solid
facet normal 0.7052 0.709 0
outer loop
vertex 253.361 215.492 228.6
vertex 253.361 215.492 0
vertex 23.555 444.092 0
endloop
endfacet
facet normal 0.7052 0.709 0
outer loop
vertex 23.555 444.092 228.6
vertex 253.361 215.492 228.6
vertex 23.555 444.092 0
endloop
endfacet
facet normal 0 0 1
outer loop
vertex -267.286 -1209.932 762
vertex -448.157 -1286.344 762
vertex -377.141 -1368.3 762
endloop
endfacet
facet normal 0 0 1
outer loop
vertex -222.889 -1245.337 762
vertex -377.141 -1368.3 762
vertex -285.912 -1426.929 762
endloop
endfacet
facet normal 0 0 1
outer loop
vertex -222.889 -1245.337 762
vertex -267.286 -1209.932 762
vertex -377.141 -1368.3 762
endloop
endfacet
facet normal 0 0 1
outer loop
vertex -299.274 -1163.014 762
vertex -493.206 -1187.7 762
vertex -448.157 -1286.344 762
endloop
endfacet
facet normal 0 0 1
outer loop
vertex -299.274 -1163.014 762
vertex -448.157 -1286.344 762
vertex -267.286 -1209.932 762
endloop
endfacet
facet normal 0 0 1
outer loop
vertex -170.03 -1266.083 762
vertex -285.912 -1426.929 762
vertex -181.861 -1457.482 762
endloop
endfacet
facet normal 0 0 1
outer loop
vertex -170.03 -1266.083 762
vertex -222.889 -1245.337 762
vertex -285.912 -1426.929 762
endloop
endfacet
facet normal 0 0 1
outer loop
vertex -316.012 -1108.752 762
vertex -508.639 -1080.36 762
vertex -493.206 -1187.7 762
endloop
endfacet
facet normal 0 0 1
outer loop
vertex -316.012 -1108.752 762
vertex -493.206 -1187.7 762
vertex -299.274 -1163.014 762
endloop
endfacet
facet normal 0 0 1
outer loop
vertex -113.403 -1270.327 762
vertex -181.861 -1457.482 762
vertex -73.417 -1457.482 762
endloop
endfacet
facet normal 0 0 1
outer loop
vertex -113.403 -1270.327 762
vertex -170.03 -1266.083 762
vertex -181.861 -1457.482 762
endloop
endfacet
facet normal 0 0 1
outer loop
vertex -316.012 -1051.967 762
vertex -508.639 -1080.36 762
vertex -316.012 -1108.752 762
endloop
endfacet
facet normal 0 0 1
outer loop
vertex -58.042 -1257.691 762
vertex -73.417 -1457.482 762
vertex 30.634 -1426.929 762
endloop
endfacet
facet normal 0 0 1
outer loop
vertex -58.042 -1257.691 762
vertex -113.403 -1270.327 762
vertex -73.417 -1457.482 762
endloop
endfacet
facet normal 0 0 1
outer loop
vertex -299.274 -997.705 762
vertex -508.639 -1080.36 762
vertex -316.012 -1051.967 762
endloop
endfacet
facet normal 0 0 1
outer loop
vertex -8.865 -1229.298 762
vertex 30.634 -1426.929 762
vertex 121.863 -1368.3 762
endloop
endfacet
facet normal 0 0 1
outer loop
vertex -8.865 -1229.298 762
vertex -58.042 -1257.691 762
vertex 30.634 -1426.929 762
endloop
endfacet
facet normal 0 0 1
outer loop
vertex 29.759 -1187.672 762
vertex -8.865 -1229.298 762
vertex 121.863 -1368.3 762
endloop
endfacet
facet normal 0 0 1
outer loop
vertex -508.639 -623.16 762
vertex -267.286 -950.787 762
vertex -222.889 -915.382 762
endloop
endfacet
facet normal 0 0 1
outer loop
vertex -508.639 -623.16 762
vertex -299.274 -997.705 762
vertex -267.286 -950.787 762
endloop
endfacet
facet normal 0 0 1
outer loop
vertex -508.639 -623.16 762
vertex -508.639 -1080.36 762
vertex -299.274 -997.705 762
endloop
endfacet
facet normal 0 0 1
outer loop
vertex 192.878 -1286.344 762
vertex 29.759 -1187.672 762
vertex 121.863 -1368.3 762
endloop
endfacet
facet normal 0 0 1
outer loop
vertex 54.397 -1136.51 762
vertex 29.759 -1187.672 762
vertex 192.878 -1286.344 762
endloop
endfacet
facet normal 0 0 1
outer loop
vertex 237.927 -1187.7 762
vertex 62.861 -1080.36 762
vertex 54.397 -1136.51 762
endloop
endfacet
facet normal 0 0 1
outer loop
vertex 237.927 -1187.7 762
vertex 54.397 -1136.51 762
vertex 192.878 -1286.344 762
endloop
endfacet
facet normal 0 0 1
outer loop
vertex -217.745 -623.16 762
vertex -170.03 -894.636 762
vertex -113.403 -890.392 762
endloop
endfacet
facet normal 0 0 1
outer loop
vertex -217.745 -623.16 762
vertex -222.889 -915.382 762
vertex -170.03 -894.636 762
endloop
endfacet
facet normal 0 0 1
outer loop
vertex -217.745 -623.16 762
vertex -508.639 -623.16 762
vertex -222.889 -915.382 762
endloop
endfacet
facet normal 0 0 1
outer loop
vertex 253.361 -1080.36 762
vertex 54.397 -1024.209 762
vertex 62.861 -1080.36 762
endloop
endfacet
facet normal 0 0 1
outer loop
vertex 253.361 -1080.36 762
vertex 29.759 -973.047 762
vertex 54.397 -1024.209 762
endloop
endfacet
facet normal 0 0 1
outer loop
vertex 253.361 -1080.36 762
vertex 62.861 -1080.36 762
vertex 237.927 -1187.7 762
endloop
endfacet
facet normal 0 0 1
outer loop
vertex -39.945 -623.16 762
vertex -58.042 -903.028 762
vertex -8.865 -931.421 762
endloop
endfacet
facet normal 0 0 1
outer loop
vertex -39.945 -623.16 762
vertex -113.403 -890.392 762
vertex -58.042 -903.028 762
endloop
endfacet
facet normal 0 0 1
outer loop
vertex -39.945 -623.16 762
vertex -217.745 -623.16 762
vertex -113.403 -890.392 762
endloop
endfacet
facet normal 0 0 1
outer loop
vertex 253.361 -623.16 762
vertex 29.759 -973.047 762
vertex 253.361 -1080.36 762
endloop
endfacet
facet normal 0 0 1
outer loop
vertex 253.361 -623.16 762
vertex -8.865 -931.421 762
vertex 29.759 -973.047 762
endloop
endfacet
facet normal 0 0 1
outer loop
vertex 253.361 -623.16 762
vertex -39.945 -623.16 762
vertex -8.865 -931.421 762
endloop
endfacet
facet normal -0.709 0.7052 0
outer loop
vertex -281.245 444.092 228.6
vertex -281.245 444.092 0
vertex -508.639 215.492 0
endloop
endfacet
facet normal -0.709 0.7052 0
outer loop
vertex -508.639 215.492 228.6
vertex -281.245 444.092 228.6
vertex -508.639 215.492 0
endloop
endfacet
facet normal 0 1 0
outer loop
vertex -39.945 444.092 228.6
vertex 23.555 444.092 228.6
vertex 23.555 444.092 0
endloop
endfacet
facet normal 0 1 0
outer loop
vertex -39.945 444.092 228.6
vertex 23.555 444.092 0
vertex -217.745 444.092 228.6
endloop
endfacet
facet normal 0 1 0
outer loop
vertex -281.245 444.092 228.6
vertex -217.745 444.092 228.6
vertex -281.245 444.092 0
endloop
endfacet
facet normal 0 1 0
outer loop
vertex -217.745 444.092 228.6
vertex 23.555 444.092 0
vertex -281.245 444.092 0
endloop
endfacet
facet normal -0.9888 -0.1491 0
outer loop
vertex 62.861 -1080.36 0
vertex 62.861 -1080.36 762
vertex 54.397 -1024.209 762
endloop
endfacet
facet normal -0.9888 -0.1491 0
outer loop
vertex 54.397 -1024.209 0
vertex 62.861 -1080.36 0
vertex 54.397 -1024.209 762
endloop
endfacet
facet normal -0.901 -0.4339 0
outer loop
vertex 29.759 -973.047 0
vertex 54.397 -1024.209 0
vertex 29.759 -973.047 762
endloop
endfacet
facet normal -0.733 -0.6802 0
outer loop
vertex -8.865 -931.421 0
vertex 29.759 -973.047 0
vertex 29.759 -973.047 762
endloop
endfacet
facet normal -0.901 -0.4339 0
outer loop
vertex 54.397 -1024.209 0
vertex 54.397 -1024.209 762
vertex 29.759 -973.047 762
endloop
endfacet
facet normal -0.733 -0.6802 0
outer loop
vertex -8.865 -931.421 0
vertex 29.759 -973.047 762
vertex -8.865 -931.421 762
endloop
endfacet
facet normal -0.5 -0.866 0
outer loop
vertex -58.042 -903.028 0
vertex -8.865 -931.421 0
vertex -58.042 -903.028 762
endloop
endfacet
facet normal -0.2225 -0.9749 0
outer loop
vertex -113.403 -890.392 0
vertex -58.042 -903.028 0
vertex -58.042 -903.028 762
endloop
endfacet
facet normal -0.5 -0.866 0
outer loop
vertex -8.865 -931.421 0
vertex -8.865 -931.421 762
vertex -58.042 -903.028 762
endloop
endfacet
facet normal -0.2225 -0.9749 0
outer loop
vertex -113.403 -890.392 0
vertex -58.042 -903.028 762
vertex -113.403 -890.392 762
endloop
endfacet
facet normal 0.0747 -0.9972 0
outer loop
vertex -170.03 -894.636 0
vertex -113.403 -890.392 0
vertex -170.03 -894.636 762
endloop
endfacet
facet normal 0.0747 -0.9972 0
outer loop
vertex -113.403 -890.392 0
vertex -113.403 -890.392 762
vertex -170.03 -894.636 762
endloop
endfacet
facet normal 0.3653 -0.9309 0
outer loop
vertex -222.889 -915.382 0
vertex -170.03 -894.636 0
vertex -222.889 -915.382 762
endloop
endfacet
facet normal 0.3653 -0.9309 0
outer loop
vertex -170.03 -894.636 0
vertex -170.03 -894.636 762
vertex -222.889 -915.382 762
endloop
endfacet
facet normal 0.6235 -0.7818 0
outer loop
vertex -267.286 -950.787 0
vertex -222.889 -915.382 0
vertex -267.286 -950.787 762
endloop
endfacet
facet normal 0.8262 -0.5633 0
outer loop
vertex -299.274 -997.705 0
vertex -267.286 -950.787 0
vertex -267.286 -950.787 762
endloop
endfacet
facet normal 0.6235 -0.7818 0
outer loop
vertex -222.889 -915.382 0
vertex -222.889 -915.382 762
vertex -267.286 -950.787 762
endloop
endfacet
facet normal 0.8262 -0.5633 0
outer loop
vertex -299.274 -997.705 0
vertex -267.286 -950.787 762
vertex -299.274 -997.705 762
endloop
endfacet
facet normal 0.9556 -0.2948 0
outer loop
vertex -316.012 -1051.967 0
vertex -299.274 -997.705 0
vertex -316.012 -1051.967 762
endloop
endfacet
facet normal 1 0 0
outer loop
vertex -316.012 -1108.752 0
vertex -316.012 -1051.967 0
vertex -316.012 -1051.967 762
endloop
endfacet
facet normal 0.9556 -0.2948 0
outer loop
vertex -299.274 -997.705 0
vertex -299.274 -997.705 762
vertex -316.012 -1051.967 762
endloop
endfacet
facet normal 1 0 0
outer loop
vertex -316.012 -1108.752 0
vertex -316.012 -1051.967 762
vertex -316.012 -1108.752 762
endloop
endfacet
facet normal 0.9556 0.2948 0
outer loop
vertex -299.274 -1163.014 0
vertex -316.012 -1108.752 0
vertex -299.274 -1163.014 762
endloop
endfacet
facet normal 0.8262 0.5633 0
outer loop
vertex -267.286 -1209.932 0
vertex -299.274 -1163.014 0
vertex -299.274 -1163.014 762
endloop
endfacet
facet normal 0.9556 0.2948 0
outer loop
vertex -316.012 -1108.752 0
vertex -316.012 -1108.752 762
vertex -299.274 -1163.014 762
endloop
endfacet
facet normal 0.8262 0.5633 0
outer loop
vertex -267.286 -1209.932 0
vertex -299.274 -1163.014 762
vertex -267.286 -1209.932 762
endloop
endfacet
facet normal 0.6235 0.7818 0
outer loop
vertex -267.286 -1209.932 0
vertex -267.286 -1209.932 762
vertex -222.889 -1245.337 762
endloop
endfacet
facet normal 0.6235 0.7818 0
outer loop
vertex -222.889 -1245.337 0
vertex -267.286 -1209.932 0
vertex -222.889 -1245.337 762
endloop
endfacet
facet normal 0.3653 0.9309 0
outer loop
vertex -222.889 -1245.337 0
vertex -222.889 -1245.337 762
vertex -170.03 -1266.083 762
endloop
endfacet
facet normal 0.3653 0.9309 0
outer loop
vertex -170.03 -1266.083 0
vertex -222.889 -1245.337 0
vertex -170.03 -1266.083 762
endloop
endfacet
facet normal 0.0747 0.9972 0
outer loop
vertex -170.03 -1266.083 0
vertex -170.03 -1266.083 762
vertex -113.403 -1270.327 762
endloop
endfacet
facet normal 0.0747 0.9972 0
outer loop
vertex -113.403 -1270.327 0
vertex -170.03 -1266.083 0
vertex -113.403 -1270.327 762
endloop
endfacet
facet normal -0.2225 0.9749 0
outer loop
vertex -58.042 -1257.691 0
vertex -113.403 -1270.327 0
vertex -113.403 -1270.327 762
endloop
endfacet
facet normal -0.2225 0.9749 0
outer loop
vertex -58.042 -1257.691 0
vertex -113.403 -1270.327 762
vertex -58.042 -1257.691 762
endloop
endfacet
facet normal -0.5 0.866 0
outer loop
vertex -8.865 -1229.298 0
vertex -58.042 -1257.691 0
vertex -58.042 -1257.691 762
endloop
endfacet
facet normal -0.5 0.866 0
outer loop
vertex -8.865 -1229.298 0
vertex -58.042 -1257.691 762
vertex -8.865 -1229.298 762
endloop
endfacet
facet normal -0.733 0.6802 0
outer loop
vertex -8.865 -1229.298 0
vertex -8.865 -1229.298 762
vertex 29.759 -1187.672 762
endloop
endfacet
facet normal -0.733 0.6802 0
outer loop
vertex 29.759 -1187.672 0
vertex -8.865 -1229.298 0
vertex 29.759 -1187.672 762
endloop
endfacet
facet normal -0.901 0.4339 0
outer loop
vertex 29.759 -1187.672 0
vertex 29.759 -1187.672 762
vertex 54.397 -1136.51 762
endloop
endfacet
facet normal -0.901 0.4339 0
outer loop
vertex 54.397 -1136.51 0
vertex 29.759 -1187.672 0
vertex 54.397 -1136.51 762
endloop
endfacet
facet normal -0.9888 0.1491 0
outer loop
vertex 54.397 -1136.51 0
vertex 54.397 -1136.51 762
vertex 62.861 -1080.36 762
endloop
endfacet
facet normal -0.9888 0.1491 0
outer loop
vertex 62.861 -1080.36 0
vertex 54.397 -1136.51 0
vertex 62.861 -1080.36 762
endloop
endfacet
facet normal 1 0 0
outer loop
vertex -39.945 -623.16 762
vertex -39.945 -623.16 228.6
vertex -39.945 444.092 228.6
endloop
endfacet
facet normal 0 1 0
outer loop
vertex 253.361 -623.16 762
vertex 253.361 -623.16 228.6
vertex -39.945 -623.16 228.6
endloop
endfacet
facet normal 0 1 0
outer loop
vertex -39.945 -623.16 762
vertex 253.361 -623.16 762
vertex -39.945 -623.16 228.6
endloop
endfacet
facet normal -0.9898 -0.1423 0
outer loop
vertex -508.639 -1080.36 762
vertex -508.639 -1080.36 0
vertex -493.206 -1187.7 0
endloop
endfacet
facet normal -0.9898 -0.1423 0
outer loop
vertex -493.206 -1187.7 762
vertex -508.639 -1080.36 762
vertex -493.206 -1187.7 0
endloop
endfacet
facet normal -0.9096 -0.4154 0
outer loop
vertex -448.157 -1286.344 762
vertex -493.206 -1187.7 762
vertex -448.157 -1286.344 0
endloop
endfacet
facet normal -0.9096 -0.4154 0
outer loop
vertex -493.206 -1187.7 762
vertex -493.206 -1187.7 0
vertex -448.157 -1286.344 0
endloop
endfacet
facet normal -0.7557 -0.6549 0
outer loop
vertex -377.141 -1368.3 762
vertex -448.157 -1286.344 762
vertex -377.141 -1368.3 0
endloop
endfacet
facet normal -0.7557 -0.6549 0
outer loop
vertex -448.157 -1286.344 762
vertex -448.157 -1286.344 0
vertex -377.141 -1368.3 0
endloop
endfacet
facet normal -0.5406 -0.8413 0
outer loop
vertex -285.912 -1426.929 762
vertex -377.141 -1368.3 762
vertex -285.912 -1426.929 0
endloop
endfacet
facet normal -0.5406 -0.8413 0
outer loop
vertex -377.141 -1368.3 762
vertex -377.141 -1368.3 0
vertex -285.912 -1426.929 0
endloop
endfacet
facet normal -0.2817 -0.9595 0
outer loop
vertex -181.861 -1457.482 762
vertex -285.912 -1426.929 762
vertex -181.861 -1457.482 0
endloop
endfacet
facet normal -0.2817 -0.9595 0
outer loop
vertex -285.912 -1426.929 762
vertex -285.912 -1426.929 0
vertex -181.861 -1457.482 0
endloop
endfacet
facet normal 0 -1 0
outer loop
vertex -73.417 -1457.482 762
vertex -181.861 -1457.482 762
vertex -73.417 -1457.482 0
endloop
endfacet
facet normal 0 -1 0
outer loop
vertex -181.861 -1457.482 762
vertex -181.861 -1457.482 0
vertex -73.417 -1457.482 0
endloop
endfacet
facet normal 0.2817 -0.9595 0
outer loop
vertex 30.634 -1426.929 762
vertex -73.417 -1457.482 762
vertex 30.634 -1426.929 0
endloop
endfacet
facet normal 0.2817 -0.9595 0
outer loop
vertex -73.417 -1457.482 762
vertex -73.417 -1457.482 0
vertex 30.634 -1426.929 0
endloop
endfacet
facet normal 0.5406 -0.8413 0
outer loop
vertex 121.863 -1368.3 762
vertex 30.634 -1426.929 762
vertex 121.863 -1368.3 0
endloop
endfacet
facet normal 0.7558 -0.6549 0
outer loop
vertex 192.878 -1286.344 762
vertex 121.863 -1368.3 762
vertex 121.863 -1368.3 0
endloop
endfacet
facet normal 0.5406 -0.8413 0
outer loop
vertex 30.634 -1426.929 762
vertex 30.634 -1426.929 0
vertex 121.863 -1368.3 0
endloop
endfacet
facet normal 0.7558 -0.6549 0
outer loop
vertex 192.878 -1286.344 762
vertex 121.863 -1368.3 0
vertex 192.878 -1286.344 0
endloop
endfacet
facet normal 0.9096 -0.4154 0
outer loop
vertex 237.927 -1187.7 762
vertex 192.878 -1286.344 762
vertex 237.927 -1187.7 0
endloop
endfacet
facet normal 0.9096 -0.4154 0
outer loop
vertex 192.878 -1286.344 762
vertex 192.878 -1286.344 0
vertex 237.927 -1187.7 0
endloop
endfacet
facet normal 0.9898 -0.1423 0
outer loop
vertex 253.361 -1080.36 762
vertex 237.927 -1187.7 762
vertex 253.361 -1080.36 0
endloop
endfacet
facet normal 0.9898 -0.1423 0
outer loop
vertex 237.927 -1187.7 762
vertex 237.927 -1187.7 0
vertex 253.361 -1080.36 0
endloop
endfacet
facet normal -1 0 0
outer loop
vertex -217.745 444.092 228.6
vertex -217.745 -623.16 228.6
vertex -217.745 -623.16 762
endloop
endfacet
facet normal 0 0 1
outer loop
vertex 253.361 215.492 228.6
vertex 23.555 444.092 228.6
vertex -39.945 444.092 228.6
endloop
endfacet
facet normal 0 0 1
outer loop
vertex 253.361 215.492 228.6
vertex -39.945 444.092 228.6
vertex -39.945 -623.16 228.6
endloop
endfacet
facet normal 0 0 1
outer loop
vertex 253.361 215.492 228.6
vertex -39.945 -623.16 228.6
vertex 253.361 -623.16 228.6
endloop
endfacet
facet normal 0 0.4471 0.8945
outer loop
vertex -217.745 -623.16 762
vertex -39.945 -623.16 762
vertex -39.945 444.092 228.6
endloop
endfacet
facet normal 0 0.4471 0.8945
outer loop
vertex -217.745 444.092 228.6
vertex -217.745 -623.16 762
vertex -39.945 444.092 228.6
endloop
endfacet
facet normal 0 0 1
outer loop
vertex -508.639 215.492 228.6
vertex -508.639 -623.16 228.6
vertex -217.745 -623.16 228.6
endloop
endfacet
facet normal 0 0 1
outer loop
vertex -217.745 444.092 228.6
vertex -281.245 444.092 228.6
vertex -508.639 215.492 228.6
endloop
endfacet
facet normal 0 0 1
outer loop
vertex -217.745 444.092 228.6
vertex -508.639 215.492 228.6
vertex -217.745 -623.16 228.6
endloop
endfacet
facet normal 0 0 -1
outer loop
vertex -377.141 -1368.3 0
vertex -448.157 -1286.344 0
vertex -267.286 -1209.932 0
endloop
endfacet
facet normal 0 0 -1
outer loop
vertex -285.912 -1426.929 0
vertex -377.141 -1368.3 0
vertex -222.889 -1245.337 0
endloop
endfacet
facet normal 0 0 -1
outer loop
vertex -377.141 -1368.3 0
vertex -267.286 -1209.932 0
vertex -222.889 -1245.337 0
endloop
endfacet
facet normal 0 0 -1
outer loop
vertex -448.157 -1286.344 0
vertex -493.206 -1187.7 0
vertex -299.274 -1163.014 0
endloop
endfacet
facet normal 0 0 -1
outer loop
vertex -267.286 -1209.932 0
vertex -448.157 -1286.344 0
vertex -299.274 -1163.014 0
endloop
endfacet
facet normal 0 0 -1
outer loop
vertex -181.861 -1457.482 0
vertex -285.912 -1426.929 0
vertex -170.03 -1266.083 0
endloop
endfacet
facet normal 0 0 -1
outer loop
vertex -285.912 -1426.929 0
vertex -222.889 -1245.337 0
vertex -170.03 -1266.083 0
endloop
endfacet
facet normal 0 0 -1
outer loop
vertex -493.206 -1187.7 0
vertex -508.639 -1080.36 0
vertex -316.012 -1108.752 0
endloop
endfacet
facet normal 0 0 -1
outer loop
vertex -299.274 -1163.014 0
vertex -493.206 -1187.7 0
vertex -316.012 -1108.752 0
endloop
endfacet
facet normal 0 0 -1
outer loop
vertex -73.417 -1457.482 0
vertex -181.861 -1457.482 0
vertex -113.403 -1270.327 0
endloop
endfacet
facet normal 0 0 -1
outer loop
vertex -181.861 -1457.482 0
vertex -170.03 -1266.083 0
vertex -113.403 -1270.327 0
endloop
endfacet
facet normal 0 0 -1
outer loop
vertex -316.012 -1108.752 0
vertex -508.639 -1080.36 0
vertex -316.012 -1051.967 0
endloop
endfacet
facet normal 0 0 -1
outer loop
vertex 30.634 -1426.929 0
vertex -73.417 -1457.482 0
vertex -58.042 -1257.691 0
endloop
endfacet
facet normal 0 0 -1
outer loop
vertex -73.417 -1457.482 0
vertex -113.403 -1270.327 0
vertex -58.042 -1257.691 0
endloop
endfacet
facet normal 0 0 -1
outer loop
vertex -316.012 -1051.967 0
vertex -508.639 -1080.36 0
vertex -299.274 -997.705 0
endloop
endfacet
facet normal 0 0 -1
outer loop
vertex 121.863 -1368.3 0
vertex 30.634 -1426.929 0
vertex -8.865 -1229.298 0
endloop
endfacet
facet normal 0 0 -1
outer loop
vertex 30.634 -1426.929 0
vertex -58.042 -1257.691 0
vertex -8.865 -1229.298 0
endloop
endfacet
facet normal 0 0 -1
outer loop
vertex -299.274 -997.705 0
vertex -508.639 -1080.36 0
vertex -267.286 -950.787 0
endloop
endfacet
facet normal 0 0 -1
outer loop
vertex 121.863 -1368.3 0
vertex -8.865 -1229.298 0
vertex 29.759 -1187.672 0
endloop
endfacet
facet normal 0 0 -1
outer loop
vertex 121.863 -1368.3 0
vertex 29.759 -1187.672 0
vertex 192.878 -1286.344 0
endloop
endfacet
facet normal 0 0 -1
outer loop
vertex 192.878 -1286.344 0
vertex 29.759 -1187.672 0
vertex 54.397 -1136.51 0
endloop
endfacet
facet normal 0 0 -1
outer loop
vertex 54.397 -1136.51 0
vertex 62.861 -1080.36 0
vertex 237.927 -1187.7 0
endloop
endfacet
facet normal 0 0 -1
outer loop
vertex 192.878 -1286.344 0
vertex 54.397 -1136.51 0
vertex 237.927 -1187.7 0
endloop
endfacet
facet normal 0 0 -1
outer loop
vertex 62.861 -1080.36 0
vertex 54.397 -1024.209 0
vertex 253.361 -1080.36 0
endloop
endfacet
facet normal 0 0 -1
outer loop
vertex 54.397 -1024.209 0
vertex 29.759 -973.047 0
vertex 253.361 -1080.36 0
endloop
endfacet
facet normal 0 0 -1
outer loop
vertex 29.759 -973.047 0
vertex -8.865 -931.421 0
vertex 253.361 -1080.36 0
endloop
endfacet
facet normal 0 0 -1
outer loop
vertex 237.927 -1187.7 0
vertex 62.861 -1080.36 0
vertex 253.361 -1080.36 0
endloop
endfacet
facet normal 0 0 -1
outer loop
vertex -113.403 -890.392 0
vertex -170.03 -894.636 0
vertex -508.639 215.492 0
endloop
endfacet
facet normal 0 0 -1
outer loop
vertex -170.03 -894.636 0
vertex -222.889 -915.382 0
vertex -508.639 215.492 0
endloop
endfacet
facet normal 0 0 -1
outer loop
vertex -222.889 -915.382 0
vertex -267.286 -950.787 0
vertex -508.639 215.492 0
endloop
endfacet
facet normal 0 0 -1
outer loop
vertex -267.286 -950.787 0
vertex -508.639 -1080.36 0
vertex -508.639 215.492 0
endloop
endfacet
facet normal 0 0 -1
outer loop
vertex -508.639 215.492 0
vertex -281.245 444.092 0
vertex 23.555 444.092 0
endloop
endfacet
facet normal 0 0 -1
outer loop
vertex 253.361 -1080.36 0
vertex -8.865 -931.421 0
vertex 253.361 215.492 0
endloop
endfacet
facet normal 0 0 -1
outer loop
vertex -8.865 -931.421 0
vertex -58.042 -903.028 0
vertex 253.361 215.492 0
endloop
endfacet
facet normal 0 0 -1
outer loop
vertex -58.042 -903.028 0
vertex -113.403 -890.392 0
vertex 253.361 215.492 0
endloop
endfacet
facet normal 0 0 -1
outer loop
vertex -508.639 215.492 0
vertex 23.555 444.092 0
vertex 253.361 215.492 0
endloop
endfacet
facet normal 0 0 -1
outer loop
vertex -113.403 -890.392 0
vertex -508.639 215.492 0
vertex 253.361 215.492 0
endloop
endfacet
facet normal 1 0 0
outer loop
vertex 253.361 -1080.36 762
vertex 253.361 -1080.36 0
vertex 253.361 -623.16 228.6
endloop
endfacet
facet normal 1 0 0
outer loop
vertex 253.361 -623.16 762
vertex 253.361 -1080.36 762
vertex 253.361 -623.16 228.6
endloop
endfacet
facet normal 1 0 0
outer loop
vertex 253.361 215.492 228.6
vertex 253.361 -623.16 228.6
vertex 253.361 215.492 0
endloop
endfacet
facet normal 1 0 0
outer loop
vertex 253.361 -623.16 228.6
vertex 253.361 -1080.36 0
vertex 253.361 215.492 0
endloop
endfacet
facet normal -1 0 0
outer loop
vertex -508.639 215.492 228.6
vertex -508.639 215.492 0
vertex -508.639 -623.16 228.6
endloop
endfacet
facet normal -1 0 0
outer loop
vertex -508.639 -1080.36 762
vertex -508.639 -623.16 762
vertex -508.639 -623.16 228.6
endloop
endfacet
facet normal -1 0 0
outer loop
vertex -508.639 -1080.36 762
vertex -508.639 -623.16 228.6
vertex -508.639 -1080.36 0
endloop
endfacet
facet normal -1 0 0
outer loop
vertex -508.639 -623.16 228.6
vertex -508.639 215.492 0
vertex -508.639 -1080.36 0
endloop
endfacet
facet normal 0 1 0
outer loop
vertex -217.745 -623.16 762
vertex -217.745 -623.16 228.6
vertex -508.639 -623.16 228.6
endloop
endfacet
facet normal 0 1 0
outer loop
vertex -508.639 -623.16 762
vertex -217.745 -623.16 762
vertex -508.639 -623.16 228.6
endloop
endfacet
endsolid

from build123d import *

# Parameters (mm, degrees)
F2_DEPTH = 228.6
F3_DEPTH = 762
F4_W     = 177.8
F4_H     = 1067.2513021181
F5_DEPTH = 533.4
F7_DEPTH = 3810
F8_R     = 190.5
F9_DEPTH = 1143


with BuildPart() as f2:
    # F0 (on Top) → F2 (new body)
    with BuildSketch(Plane.XY):
        Polygon((23.5545643418, 444.0917239854), (-281.2454356582, 444.0917239854), (-508.6393237951, 215.4917239854), (-508.6393237951, -1079.9082760146), (253.3606762049, -1079.9082760146), (253.3606762049, 215.4917239854), align=None)
    extrude(amount=F2_DEPTH)

    # F1 (on Top) → F3 (join)
    with BuildSketch(Plane.XY):
        with BuildLine():
            Line((-508.6393237951, -1080.3595781326), (253.3606762049, -1080.3595781326))
            ThreePointArc((253.3606762049, -1080.3595781326), (-127.6393237951, -699.3595781326), (-508.6393237951, -1080.3595781326))
        make_face()
        with BuildLine():
            ThreePointArc((-508.6393237951, -1080.3595781326), (-127.6393237951, -1461.3595781326), (253.3606762049, -1080.3595781326))
            Line((253.3606762049, -1080.3595781326), (-508.6393237951, -1080.3595781326))
        make_face()
        with BuildLine():
            ThreePointArc((-508.6393237951, -1080.3595781326), (-127.6393237951, -699.3595781326), (253.3606762049, -1080.3595781326))
            Line((253.3606762049, -1080.3595781326), (253.3606762049, -623.1595781326))
            Line((253.3606762049, -623.1595781326), (-508.6393237951, -623.1595781326))
            Line((-508.6393237951, -623.1595781326), (-508.6393237951, -1080.3595781326))
        make_face()
    extrude(amount=F3_DEPTH)

    # F4 (on face) → F5 (join)
    with BuildSketch(Plane.XY.offset(228.6)):
        with Locations((-128.8454356582, -89.5339270736)):
            Rectangle(F4_W, F4_H)
    extrude(amount=F5_DEPTH)

    # F6 (on face) → F7 (cut)
    with BuildSketch(Plane.YZ.offset(-39.9454356582)):
        Polygon((444.0917239854, 762), (-623.1595781326, 762), (444.0917239854, 228.6), align=None)
    extrude(amount=-F7_DEPTH, mode=Mode.SUBTRACT)

    # F8 (on face) → F9 (cut)
    with BuildSketch(Plane.XY.offset(762)):
        with Locations((-127.6393237951, -1080.3595781326)):
            Circle(F8_R)
    extrude(amount=-F9_DEPTH, mode=Mode.SUBTRACT)


solid = f2.part
